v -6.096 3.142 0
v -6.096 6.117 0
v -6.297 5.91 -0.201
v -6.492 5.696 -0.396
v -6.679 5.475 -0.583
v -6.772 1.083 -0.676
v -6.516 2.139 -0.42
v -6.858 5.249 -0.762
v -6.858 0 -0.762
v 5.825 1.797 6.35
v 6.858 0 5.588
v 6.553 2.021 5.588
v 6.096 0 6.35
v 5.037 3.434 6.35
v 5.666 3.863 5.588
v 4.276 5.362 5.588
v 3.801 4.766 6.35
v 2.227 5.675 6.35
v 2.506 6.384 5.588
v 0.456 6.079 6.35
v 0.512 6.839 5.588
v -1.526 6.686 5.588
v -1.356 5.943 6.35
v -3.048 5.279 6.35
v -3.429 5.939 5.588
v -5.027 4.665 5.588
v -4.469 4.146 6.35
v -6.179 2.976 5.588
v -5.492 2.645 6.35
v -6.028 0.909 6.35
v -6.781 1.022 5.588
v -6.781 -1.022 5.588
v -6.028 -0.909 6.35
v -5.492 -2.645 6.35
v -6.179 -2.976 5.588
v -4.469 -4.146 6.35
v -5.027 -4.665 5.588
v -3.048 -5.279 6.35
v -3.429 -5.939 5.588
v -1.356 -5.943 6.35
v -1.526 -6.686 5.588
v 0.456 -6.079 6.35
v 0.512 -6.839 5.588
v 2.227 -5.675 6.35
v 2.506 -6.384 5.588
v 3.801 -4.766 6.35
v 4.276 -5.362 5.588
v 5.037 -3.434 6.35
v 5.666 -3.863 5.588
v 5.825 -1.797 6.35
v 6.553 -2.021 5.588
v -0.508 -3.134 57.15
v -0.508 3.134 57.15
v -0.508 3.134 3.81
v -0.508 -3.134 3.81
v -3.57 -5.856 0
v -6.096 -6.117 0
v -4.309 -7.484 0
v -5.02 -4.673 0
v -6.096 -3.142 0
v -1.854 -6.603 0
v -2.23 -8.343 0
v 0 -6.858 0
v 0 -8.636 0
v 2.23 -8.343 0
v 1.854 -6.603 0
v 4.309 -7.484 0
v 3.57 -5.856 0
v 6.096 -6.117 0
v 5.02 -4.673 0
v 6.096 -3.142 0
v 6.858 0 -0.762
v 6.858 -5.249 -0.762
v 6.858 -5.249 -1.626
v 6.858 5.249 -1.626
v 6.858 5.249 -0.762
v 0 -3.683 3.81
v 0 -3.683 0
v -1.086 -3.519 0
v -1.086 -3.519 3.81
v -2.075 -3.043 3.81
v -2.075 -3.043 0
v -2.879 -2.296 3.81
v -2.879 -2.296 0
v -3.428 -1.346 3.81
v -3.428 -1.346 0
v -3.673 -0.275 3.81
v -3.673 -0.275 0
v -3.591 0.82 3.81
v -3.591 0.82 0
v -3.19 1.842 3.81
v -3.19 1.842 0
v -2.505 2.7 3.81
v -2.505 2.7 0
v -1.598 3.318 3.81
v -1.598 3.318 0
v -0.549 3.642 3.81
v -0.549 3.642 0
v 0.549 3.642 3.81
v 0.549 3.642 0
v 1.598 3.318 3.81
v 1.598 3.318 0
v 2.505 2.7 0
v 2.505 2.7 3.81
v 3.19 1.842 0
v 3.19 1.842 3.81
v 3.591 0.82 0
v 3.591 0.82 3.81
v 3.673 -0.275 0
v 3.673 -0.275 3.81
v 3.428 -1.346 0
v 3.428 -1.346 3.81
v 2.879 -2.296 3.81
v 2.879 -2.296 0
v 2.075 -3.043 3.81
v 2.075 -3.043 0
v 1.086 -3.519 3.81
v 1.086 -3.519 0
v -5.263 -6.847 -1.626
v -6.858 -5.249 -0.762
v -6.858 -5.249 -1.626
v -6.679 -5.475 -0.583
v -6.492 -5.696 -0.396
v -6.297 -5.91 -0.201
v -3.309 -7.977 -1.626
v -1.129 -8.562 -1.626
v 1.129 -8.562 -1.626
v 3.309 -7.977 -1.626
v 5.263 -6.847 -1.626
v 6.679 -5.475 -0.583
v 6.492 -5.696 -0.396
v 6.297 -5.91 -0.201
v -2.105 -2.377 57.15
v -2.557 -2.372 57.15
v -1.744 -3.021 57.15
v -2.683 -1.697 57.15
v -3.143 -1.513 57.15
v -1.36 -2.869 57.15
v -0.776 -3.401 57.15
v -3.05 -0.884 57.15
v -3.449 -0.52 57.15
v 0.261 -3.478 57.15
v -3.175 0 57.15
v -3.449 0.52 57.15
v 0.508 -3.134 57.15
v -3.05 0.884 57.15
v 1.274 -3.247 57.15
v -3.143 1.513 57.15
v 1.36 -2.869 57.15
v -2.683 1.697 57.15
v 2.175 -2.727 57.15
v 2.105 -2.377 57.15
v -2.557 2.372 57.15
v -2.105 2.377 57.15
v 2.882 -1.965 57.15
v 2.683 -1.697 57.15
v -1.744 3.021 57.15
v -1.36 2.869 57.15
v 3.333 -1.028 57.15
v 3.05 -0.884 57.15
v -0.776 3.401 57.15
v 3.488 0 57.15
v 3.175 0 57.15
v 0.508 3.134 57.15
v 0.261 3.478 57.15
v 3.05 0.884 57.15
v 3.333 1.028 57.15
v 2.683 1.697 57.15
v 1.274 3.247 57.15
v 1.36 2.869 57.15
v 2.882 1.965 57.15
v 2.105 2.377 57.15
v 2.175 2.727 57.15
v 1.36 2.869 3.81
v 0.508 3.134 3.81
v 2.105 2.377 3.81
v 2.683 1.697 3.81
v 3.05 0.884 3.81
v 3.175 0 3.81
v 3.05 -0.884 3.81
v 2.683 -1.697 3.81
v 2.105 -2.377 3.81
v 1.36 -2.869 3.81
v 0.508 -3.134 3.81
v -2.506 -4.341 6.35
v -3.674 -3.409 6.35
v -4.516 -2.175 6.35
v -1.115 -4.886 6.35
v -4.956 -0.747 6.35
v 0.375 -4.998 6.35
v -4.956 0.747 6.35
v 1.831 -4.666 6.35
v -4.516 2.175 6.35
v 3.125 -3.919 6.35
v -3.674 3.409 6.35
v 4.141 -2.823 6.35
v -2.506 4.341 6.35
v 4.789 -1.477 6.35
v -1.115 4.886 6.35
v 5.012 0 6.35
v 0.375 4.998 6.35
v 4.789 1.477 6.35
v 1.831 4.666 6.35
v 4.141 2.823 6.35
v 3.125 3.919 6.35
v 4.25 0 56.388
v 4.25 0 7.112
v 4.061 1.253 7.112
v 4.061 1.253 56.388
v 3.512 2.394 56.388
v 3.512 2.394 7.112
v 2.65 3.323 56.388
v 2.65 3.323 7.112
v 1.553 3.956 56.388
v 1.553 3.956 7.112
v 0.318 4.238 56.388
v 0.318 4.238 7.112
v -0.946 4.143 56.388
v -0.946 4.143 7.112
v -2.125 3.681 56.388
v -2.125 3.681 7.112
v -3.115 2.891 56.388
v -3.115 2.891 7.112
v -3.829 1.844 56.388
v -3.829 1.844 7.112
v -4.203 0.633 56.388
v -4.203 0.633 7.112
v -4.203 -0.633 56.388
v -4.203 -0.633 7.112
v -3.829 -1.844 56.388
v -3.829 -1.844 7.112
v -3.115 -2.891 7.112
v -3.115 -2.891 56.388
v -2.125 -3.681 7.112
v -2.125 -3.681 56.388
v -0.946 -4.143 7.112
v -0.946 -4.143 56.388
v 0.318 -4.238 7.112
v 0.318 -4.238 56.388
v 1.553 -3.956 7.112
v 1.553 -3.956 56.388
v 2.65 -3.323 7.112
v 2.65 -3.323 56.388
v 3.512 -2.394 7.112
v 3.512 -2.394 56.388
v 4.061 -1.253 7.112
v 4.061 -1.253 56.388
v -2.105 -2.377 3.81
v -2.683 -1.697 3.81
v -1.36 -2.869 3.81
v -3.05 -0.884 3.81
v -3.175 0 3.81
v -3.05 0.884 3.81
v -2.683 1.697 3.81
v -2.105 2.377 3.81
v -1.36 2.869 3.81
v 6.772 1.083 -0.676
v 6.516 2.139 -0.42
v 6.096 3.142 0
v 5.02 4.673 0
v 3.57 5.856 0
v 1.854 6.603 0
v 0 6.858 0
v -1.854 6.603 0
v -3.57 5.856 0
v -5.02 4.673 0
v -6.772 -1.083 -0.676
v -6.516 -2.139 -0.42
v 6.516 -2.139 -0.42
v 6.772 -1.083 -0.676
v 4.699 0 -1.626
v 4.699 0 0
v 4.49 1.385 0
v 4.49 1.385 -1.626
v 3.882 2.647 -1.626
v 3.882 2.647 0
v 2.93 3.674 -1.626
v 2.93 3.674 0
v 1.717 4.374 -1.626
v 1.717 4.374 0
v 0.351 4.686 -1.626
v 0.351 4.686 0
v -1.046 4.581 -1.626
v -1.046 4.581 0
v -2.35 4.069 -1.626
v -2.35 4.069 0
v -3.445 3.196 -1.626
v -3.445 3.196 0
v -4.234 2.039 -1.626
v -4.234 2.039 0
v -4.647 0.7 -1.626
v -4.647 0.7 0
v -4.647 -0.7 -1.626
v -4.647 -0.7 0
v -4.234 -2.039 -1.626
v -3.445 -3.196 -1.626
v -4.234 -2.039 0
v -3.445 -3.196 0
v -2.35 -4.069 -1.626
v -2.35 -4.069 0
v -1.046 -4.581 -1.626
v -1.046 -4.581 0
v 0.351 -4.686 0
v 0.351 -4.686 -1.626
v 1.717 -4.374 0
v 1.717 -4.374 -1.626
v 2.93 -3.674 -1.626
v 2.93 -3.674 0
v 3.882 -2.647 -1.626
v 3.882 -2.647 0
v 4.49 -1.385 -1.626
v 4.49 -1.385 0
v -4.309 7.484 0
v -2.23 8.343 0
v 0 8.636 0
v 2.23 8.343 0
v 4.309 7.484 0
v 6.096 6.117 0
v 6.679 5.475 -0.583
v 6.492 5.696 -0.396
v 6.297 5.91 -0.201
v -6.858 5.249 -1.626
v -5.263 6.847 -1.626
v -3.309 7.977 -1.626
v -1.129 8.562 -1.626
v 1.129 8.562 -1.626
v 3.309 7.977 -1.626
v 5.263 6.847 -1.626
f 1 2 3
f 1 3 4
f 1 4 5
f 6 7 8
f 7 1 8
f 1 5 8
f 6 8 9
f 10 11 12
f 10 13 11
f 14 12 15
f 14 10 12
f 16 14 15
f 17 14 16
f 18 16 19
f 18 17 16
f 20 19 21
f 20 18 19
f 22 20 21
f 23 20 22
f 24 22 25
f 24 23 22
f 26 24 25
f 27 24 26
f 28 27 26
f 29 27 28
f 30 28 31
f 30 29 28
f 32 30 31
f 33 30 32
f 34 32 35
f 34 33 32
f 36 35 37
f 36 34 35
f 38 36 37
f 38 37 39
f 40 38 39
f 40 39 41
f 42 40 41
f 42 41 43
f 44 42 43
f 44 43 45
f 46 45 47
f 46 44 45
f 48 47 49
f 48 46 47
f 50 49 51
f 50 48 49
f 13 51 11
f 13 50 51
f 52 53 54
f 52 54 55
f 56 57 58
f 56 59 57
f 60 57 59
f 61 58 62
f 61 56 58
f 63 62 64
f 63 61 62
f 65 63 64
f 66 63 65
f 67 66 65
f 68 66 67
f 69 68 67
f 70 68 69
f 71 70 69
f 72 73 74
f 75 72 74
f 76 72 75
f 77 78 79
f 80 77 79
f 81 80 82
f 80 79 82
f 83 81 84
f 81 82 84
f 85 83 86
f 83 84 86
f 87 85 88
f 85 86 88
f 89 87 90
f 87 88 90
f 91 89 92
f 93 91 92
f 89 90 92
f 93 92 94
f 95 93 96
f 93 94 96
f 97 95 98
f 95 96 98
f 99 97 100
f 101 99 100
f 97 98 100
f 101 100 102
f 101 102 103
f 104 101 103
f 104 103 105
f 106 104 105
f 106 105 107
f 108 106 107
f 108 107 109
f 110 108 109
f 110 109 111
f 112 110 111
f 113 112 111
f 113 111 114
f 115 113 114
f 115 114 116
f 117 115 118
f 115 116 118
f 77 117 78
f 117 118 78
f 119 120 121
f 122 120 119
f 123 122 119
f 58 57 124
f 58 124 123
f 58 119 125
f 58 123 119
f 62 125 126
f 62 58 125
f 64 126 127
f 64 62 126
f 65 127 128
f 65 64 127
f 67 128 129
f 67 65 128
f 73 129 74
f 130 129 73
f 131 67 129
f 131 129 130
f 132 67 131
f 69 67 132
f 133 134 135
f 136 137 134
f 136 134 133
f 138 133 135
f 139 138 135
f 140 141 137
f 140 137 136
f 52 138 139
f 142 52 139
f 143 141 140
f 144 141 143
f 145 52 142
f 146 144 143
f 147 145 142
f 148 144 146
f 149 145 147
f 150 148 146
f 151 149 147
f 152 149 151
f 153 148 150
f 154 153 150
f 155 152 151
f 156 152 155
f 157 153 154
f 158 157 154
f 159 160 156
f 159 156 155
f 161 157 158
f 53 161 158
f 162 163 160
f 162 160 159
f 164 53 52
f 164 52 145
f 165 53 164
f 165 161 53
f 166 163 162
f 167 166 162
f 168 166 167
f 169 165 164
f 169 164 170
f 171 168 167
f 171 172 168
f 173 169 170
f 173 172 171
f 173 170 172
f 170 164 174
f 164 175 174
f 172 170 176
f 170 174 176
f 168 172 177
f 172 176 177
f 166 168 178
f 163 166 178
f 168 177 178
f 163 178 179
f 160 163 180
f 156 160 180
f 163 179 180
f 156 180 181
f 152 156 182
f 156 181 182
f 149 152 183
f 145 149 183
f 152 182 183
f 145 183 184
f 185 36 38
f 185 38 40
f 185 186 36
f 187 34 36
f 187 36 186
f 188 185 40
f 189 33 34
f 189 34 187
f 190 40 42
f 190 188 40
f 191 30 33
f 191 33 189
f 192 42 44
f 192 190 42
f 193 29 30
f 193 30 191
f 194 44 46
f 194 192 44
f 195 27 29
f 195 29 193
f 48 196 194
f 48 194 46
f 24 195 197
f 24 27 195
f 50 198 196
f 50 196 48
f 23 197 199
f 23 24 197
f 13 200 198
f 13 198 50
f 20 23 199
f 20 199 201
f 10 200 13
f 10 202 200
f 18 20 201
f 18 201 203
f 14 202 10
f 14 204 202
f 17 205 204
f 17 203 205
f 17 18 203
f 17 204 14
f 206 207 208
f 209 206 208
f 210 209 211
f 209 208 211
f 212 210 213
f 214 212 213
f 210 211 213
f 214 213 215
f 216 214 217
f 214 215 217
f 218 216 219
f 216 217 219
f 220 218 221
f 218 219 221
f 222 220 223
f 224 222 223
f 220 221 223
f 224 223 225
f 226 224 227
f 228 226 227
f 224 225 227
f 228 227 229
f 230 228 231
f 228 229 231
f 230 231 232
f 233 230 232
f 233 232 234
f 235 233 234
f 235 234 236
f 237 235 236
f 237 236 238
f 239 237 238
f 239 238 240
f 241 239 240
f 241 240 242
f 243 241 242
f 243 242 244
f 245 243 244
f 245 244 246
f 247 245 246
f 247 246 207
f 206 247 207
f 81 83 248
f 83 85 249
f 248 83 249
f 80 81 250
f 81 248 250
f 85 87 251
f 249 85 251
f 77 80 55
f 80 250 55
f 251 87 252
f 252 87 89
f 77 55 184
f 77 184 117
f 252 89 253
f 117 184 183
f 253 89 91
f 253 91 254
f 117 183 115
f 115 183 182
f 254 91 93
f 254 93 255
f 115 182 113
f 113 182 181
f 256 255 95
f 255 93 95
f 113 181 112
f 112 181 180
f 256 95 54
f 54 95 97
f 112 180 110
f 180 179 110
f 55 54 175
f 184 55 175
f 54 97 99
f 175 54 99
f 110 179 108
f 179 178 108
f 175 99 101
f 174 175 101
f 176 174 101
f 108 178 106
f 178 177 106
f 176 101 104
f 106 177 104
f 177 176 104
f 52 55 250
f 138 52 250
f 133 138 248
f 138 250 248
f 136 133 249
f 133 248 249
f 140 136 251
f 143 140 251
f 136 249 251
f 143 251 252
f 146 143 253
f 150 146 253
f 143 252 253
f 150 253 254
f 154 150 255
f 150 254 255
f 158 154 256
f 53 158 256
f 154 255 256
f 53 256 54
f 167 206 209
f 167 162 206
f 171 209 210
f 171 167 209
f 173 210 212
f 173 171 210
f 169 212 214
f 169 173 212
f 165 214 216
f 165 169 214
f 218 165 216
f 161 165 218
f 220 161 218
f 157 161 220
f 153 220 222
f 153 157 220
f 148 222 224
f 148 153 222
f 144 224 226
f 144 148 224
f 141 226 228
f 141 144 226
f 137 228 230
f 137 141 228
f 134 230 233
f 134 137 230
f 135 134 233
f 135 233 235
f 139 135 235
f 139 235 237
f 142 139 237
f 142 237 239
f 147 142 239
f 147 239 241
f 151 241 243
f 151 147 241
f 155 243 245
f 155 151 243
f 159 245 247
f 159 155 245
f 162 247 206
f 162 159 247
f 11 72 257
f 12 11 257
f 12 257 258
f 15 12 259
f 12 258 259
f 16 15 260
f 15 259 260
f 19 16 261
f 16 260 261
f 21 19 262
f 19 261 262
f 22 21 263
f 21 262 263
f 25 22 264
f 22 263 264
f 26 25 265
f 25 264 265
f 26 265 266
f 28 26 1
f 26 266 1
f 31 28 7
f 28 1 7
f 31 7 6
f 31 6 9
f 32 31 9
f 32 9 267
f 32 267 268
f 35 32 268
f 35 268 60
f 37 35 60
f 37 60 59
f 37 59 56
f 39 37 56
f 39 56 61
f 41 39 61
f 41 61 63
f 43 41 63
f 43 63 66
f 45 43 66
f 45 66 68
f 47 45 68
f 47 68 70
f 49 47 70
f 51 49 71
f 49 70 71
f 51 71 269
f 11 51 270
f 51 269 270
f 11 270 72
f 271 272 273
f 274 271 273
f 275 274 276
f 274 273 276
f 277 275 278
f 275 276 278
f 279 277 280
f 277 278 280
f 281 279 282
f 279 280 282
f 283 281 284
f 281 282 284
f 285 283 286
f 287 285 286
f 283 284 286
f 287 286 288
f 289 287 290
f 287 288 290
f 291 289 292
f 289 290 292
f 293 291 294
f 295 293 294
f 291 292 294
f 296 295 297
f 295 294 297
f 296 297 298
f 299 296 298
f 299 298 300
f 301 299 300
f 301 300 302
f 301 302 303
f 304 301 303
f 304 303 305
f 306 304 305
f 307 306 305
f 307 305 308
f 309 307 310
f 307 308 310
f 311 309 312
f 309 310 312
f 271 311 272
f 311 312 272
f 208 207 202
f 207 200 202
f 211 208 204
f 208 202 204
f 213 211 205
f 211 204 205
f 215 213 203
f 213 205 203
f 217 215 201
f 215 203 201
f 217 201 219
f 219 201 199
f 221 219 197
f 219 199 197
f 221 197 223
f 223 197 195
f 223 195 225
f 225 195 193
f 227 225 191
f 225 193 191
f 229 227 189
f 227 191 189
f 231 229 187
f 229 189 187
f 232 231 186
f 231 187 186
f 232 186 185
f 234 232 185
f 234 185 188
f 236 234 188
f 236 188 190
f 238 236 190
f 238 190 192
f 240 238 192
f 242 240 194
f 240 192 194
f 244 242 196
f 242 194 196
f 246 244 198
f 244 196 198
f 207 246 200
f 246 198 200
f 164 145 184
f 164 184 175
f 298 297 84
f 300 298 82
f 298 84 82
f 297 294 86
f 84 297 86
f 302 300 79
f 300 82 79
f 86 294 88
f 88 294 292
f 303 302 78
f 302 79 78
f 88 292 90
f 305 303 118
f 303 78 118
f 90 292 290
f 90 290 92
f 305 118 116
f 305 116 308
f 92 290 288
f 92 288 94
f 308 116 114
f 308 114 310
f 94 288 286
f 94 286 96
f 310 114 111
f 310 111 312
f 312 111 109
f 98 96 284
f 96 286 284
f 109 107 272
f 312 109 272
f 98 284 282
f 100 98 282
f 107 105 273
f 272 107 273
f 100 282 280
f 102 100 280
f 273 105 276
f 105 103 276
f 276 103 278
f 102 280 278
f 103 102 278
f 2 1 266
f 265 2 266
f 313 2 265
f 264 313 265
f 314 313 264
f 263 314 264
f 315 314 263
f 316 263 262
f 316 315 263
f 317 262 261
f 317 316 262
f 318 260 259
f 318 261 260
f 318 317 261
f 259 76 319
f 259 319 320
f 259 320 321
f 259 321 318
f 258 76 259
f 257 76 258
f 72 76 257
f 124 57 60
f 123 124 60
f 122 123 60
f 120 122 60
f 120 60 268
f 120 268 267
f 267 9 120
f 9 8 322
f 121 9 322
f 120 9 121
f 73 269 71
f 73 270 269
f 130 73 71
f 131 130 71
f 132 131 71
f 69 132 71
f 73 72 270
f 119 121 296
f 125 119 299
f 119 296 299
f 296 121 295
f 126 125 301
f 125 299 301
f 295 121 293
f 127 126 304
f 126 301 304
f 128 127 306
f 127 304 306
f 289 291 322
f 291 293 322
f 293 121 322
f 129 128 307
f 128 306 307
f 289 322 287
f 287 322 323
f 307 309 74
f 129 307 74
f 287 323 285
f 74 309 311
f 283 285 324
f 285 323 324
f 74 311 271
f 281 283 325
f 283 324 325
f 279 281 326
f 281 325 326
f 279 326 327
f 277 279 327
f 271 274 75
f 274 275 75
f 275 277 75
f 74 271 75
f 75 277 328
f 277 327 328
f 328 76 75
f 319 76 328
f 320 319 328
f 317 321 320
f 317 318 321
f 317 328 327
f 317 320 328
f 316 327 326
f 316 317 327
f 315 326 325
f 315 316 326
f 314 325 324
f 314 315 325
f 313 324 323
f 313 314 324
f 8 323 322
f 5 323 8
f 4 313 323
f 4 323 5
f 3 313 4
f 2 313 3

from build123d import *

# Parameters (mm, degrees)
F0_R         = 4.699
F1_DEPTH     = 1.6256
F3_DEPTH     = 3.81
F4_R         = 6.858
F5_DEPTH     = 2.54
F6_R         = 4.25
F7_DEPTH     = 50.8
F8_T8_DEPTH  = 7.2082729301
F8_S9_R      = 6.858
F8_T10_DEPTH = 5
F8_T14_DEPTH = 7.2082729301
F8_S15_R     = 6.858
F8_T16_DEPTH = 5
F8_T22_DEPTH = 7.2082729301
F8_S23_R     = 6.858
F8_T24_DEPTH = 5
F8_T28_DEPTH = 7.2082729301
F8_S29_R     = 6.858
F8_T30_DEPTH = 5


# Not quite as in the source:
# - a fillet or chamfer that OpenCascade refuses, or shapes differently, is made with other operations: its cross-section is extruded or revolved along the edge and cut away or added


with BuildPart() as f1:
    # F0 (on Top) → F1 (new body)
    with BuildSketch(Plane.XY):
        with BuildLine():
            Line((6.858, -5.2486504932), (6.858, 5.2486504932))
            ThreePointArc((6.858, 5.2486504932), (0, 8.636), (-6.858, 5.2486504932))
            Line((-6.858, 5.2486504932), (-6.858, -5.2486504932))
            ThreePointArc((-6.858, -5.2486504932), (0, -8.636), (6.858, -5.2486504932))
        make_face()
        Circle(F0_R, mode=Mode.SUBTRACT)
    extrude(amount=-F1_DEPTH)

    # F2 (on face) → F3 (join)
    with BuildSketch(Plane.XY):
        with BuildLine():
            ThreePointArc((-6.858, 0), (0, -6.858), (6.858, 0))
            ThreePointArc((6.858, 0), (0, 6.858), (-6.858, 0))
        make_face()
        with BuildLine():
            ThreePointArc((0, 3.683), (3.683, 0), (0, -3.683))
            ThreePointArc((0, -3.683), (-3.683, 0), (0, 3.683))
        make_face(mode=Mode.SUBTRACT)
    extrude(amount=F3_DEPTH)

    # F4 (on face) → F5 (join)
    with BuildSketch(Plane.XY.offset(3.81)):
        Circle(F4_R)
        with BuildLine():
            Line((-0.508, 3.1340965205), (-0.508, -3.1340965205))
            ThreePointArc((-0.508, -3.1340965205), (-3.175, 0), (-0.508, 3.1340965205))
        make_face(mode=Mode.SUBTRACT)
        with BuildLine():
            ThreePointArc((0.508, 3.1340965205), (3.175, 0), (0.508, -3.1340965205))
            Line((0.508, -3.1340965205), (0.508, 3.1340965205))
        make_face(mode=Mode.SUBTRACT)
    extrude(amount=F5_DEPTH)

    # F6 (on face) → F7 (join)
    with BuildSketch(Plane.XY.offset(6.35)):
        Circle(F6_R)
        with BuildLine():
            Line((-0.508, 3.1340965205), (-0.508, -3.1340965205))
            ThreePointArc((-0.508, -3.1340965205), (-3.175, 0), (-0.508, 3.1340965205))
        make_face(mode=Mode.SUBTRACT)
        with BuildLine():
            ThreePointArc((0.508, 3.1340965205), (3.175, 0), (0.508, -3.1340965205))
            Line((0.508, -3.1340965205), (0.508, 3.1340965205))
        make_face(mode=Mode.SUBTRACT)
    extrude(amount=F7_DEPTH)

    # F8: chamfer of 0.762 on 5 edges, made by hand

    # F8_s1 → F8_t2 (revolve)
    with BuildSketch(Plane.XZ):
        Polygon((4.25, 7.112), (5.012, 6.35), (4.25, 6.35), align=None)
    revolve(axis=Axis((0, 0, 6.35), (0, 0, 1)))

    # F8_s3 → F8_t4 (revolve, cut)
    with BuildSketch(Plane.XZ):
        Polygon((6.858, 5.588), (6.096, 6.35), (6.858, 6.35), align=None)
    revolve(axis=Axis((0, 0, 6.35), (0, 0, 1)), mode=Mode.SUBTRACT)


with BuildPart() as f8_tool6:
    # F8_s7 → F8_t8 (new body)
    with BuildSketch(Plane.XZ.offset(-7.2082729301)):
        Polygon((-6.096, 0), (-6.858, -0.762), (-6.858, 0), align=None)
    extrude(amount=F8_T8_DEPTH)

    # F8_s9 → F8_t10 (cut, symmetric)
    with BuildSketch(Plane.XY.offset(-0.4)):
        Circle(F8_S9_R)
    extrude(amount=F8_T10_DEPTH, both=True, mode=Mode.SUBTRACT)


with BuildPart() as f1_1:
    add(f1.part)

    # F8_t5: cut F8_tool6
    add(f8_tool6.part, mode=Mode.SUBTRACT)


with BuildPart() as f8_tool12:
    # F8_s13 → F8_t14 (new body)
    with BuildSketch(Plane.XZ):
        Polygon((6.858, -0.762), (6.096, 0), (6.858, 0), align=None)
    extrude(amount=-F8_T14_DEPTH)

    # F8_s15 → F8_t16 (cut, symmetric)
    with BuildSketch(Plane.XY.offset(-0.4)):
        Circle(F8_S15_R)
    extrude(amount=F8_T16_DEPTH, both=True, mode=Mode.SUBTRACT)


with BuildPart() as f1_2:
    add(f1_1.part)

    # F8_t11: cut F8_tool12
    add(f8_tool12.part, mode=Mode.SUBTRACT)

    # F8_s17 → F8_t18 (revolve, cut)
    with BuildSketch(Plane.XZ):
        Polygon((4.25, 56.388), (3.488, 57.15), (4.25, 57.15), align=None)
    revolve(axis=Axis((0, 0, 57.15), (0, 0, 1)), mode=Mode.SUBTRACT)


with BuildPart() as f8_tool20:
    # F8_s21 → F8_t22 (new body)
    with BuildSketch(Plane.XZ.offset(7.2082729301)):
        Polygon((6.858, -0.762), (6.096, 0), (6.858, 0), align=None)
    extrude(amount=-F8_T22_DEPTH)

    # F8_s23 → F8_t24 (cut, symmetric)
    with BuildSketch(Plane.XY.offset(-0.4)):
        Circle(F8_S23_R)
    extrude(amount=F8_T24_DEPTH, both=True, mode=Mode.SUBTRACT)


with BuildPart() as f1_3:
    add(f1_2.part)

    # F8_t19: cut F8_tool20
    add(f8_tool20.part, mode=Mode.SUBTRACT)


with BuildPart() as f8_tool26:
    # F8_s27 → F8_t28 (new body)
    with BuildSketch(Plane.XZ):
        Polygon((-6.096, 0), (-6.858, -0.762), (-6.858, 0), align=None)
    extrude(amount=F8_T28_DEPTH)

    # F8_s29 → F8_t30 (cut, symmetric)
    with BuildSketch(Plane.XY.offset(-0.4)):
        Circle(F8_S29_R)
    extrude(amount=F8_T30_DEPTH, both=True, mode=Mode.SUBTRACT)


with BuildPart() as f1_4:
    add(f1_3.part)

    # F8_t25: cut F8_tool26
    add(f8_tool26.part, mode=Mode.SUBTRACT)


solid = f1_4.part
